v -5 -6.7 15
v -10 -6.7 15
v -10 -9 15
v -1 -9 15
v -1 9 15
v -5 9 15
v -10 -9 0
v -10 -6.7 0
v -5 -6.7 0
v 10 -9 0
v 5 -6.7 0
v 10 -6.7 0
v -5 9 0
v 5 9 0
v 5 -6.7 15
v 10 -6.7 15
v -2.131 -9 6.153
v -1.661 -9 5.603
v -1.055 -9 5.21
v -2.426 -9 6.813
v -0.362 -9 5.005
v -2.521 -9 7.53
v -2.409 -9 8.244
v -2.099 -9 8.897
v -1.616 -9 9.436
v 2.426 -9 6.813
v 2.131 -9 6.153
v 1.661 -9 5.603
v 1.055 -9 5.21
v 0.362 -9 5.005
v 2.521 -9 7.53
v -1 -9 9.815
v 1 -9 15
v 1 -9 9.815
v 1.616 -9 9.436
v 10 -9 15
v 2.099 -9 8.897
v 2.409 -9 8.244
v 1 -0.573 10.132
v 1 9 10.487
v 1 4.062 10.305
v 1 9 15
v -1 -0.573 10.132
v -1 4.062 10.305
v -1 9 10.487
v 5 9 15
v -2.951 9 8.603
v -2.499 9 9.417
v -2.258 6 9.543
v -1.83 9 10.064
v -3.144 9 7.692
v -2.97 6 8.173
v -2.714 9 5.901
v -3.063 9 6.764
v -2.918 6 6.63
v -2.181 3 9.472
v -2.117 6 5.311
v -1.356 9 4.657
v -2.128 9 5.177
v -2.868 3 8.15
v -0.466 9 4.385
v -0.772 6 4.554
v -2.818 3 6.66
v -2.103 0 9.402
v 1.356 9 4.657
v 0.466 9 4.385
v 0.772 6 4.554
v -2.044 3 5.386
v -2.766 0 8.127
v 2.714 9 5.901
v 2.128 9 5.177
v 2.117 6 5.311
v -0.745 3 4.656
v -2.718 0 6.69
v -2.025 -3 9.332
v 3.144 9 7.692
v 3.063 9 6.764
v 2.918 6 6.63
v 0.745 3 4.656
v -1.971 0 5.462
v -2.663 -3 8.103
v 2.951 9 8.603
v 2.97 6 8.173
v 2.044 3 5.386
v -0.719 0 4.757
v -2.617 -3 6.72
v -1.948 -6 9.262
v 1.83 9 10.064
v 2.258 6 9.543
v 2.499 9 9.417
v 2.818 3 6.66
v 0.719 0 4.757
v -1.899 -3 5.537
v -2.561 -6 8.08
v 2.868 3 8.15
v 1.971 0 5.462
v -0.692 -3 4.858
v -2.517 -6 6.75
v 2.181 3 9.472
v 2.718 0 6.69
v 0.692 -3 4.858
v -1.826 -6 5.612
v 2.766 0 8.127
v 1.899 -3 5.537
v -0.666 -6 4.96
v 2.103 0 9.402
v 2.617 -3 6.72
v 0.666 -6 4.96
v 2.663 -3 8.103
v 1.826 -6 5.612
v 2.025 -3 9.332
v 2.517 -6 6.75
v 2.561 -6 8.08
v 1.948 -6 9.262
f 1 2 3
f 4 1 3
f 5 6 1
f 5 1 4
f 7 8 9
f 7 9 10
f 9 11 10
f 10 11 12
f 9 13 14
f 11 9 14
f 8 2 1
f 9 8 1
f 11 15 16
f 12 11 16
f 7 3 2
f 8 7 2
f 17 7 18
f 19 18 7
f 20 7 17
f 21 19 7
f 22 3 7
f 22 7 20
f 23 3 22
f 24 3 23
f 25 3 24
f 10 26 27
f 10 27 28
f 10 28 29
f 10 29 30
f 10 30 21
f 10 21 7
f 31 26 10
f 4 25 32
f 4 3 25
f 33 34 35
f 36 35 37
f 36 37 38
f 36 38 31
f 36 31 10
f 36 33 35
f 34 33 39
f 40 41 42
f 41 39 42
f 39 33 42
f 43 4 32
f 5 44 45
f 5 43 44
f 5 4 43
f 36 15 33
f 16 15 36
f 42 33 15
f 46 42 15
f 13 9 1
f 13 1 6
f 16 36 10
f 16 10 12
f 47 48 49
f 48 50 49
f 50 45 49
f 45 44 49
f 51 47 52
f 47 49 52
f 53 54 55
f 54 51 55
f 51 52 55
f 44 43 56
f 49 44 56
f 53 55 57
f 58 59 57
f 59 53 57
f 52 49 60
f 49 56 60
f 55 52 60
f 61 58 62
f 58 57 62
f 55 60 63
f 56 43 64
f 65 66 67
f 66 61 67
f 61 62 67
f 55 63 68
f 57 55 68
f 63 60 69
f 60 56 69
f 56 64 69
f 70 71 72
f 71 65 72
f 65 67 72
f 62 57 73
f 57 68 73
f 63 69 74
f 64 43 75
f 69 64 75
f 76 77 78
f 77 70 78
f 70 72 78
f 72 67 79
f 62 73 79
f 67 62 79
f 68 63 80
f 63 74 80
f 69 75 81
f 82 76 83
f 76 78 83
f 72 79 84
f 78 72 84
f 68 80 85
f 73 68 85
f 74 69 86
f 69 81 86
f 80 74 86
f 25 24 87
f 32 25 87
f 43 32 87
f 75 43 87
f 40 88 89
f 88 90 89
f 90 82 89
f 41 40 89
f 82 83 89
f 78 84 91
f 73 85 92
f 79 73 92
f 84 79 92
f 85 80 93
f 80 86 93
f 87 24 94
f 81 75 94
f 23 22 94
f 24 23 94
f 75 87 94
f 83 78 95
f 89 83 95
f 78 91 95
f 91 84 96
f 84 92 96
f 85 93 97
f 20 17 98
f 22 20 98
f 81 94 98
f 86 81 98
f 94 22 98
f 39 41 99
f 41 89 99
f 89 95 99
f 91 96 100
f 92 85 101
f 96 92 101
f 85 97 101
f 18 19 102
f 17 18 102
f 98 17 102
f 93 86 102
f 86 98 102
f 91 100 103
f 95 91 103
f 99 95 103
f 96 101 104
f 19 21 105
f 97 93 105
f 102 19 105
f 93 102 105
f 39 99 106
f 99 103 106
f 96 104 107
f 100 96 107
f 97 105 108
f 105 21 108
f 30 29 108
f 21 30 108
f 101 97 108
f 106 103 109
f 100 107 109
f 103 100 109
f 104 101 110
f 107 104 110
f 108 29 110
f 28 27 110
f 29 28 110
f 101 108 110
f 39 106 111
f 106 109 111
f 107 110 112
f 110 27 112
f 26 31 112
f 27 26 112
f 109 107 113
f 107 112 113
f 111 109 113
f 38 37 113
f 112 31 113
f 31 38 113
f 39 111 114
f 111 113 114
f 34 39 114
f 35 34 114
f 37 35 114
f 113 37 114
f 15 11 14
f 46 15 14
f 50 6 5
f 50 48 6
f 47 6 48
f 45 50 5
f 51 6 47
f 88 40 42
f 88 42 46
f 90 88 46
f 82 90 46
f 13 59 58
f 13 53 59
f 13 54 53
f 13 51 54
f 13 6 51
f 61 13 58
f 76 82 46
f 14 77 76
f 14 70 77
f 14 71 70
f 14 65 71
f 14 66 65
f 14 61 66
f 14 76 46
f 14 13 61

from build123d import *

# Parameters (mm, degrees)
SKETCH1_W           = 10
SKETCH1_H           = 18
BOSS_EXTRUDE1_DEPTH = 15
SKETCH3_W           = 5
SKETCH3_H           = 2.3
BOSS_EXTRUDE2_DEPTH = 15
SKETCH4_R           = 3.15
CUT_EXTRUDE1_DEPTH  = 26.475478406
SKETCH6_W           = 2
SKETCH6_H           = 18
CUT_EXTRUDE2_DEPTH  = 8
DRAFT4_ANGLE        = 2


with BuildPart() as part:
    # Sketch1 → Boss-Extrude1 (new body)
    with BuildSketch(Plane.XY):
        Rectangle(SKETCH1_W, SKETCH1_H)
    extrude(amount=BOSS_EXTRUDE1_DEPTH)

    # Sketch3 → Boss-Extrude2 (add)
    with BuildSketch(Plane.XY.offset(15)):
        with Locations((-7.5, -7.85)):
            Rectangle(SKETCH3_W, SKETCH3_H)
        with Locations((7.5, -7.85)):
            Rectangle(SKETCH3_W, SKETCH3_H)
    extrude(amount=-BOSS_EXTRUDE2_DEPTH)

    # Sketch4 → Cut-Extrude1 (cut, through all)
    with BuildSketch(Plane.XZ.offset(9)):
        with Locations(Location((0, 7.5, 0), (0, 0, 270))):
            Circle(SKETCH4_R)
    extrude(amount=-CUT_EXTRUDE1_DEPTH, mode=Mode.SUBTRACT)

    # Sketch6 → Cut-Extrude2 (cut)
    with BuildSketch(Plane.XY.offset(15)):
        Rectangle(SKETCH6_W, SKETCH6_H)
    extrude(amount=-CUT_EXTRUDE2_DEPTH, mode=Mode.SUBTRACT)

    # Draft4
    draft4_faces = [part.faces().sort_by_distance(p)[0] for p in [
        (0, 0, 4.35),
    ]]
    draft(draft4_faces, Plane(origin=(-5, 9, 15), x_dir=(0, 0, 1), z_dir=(0, 1, 0)), DRAFT4_ANGLE)


solid = part.part
